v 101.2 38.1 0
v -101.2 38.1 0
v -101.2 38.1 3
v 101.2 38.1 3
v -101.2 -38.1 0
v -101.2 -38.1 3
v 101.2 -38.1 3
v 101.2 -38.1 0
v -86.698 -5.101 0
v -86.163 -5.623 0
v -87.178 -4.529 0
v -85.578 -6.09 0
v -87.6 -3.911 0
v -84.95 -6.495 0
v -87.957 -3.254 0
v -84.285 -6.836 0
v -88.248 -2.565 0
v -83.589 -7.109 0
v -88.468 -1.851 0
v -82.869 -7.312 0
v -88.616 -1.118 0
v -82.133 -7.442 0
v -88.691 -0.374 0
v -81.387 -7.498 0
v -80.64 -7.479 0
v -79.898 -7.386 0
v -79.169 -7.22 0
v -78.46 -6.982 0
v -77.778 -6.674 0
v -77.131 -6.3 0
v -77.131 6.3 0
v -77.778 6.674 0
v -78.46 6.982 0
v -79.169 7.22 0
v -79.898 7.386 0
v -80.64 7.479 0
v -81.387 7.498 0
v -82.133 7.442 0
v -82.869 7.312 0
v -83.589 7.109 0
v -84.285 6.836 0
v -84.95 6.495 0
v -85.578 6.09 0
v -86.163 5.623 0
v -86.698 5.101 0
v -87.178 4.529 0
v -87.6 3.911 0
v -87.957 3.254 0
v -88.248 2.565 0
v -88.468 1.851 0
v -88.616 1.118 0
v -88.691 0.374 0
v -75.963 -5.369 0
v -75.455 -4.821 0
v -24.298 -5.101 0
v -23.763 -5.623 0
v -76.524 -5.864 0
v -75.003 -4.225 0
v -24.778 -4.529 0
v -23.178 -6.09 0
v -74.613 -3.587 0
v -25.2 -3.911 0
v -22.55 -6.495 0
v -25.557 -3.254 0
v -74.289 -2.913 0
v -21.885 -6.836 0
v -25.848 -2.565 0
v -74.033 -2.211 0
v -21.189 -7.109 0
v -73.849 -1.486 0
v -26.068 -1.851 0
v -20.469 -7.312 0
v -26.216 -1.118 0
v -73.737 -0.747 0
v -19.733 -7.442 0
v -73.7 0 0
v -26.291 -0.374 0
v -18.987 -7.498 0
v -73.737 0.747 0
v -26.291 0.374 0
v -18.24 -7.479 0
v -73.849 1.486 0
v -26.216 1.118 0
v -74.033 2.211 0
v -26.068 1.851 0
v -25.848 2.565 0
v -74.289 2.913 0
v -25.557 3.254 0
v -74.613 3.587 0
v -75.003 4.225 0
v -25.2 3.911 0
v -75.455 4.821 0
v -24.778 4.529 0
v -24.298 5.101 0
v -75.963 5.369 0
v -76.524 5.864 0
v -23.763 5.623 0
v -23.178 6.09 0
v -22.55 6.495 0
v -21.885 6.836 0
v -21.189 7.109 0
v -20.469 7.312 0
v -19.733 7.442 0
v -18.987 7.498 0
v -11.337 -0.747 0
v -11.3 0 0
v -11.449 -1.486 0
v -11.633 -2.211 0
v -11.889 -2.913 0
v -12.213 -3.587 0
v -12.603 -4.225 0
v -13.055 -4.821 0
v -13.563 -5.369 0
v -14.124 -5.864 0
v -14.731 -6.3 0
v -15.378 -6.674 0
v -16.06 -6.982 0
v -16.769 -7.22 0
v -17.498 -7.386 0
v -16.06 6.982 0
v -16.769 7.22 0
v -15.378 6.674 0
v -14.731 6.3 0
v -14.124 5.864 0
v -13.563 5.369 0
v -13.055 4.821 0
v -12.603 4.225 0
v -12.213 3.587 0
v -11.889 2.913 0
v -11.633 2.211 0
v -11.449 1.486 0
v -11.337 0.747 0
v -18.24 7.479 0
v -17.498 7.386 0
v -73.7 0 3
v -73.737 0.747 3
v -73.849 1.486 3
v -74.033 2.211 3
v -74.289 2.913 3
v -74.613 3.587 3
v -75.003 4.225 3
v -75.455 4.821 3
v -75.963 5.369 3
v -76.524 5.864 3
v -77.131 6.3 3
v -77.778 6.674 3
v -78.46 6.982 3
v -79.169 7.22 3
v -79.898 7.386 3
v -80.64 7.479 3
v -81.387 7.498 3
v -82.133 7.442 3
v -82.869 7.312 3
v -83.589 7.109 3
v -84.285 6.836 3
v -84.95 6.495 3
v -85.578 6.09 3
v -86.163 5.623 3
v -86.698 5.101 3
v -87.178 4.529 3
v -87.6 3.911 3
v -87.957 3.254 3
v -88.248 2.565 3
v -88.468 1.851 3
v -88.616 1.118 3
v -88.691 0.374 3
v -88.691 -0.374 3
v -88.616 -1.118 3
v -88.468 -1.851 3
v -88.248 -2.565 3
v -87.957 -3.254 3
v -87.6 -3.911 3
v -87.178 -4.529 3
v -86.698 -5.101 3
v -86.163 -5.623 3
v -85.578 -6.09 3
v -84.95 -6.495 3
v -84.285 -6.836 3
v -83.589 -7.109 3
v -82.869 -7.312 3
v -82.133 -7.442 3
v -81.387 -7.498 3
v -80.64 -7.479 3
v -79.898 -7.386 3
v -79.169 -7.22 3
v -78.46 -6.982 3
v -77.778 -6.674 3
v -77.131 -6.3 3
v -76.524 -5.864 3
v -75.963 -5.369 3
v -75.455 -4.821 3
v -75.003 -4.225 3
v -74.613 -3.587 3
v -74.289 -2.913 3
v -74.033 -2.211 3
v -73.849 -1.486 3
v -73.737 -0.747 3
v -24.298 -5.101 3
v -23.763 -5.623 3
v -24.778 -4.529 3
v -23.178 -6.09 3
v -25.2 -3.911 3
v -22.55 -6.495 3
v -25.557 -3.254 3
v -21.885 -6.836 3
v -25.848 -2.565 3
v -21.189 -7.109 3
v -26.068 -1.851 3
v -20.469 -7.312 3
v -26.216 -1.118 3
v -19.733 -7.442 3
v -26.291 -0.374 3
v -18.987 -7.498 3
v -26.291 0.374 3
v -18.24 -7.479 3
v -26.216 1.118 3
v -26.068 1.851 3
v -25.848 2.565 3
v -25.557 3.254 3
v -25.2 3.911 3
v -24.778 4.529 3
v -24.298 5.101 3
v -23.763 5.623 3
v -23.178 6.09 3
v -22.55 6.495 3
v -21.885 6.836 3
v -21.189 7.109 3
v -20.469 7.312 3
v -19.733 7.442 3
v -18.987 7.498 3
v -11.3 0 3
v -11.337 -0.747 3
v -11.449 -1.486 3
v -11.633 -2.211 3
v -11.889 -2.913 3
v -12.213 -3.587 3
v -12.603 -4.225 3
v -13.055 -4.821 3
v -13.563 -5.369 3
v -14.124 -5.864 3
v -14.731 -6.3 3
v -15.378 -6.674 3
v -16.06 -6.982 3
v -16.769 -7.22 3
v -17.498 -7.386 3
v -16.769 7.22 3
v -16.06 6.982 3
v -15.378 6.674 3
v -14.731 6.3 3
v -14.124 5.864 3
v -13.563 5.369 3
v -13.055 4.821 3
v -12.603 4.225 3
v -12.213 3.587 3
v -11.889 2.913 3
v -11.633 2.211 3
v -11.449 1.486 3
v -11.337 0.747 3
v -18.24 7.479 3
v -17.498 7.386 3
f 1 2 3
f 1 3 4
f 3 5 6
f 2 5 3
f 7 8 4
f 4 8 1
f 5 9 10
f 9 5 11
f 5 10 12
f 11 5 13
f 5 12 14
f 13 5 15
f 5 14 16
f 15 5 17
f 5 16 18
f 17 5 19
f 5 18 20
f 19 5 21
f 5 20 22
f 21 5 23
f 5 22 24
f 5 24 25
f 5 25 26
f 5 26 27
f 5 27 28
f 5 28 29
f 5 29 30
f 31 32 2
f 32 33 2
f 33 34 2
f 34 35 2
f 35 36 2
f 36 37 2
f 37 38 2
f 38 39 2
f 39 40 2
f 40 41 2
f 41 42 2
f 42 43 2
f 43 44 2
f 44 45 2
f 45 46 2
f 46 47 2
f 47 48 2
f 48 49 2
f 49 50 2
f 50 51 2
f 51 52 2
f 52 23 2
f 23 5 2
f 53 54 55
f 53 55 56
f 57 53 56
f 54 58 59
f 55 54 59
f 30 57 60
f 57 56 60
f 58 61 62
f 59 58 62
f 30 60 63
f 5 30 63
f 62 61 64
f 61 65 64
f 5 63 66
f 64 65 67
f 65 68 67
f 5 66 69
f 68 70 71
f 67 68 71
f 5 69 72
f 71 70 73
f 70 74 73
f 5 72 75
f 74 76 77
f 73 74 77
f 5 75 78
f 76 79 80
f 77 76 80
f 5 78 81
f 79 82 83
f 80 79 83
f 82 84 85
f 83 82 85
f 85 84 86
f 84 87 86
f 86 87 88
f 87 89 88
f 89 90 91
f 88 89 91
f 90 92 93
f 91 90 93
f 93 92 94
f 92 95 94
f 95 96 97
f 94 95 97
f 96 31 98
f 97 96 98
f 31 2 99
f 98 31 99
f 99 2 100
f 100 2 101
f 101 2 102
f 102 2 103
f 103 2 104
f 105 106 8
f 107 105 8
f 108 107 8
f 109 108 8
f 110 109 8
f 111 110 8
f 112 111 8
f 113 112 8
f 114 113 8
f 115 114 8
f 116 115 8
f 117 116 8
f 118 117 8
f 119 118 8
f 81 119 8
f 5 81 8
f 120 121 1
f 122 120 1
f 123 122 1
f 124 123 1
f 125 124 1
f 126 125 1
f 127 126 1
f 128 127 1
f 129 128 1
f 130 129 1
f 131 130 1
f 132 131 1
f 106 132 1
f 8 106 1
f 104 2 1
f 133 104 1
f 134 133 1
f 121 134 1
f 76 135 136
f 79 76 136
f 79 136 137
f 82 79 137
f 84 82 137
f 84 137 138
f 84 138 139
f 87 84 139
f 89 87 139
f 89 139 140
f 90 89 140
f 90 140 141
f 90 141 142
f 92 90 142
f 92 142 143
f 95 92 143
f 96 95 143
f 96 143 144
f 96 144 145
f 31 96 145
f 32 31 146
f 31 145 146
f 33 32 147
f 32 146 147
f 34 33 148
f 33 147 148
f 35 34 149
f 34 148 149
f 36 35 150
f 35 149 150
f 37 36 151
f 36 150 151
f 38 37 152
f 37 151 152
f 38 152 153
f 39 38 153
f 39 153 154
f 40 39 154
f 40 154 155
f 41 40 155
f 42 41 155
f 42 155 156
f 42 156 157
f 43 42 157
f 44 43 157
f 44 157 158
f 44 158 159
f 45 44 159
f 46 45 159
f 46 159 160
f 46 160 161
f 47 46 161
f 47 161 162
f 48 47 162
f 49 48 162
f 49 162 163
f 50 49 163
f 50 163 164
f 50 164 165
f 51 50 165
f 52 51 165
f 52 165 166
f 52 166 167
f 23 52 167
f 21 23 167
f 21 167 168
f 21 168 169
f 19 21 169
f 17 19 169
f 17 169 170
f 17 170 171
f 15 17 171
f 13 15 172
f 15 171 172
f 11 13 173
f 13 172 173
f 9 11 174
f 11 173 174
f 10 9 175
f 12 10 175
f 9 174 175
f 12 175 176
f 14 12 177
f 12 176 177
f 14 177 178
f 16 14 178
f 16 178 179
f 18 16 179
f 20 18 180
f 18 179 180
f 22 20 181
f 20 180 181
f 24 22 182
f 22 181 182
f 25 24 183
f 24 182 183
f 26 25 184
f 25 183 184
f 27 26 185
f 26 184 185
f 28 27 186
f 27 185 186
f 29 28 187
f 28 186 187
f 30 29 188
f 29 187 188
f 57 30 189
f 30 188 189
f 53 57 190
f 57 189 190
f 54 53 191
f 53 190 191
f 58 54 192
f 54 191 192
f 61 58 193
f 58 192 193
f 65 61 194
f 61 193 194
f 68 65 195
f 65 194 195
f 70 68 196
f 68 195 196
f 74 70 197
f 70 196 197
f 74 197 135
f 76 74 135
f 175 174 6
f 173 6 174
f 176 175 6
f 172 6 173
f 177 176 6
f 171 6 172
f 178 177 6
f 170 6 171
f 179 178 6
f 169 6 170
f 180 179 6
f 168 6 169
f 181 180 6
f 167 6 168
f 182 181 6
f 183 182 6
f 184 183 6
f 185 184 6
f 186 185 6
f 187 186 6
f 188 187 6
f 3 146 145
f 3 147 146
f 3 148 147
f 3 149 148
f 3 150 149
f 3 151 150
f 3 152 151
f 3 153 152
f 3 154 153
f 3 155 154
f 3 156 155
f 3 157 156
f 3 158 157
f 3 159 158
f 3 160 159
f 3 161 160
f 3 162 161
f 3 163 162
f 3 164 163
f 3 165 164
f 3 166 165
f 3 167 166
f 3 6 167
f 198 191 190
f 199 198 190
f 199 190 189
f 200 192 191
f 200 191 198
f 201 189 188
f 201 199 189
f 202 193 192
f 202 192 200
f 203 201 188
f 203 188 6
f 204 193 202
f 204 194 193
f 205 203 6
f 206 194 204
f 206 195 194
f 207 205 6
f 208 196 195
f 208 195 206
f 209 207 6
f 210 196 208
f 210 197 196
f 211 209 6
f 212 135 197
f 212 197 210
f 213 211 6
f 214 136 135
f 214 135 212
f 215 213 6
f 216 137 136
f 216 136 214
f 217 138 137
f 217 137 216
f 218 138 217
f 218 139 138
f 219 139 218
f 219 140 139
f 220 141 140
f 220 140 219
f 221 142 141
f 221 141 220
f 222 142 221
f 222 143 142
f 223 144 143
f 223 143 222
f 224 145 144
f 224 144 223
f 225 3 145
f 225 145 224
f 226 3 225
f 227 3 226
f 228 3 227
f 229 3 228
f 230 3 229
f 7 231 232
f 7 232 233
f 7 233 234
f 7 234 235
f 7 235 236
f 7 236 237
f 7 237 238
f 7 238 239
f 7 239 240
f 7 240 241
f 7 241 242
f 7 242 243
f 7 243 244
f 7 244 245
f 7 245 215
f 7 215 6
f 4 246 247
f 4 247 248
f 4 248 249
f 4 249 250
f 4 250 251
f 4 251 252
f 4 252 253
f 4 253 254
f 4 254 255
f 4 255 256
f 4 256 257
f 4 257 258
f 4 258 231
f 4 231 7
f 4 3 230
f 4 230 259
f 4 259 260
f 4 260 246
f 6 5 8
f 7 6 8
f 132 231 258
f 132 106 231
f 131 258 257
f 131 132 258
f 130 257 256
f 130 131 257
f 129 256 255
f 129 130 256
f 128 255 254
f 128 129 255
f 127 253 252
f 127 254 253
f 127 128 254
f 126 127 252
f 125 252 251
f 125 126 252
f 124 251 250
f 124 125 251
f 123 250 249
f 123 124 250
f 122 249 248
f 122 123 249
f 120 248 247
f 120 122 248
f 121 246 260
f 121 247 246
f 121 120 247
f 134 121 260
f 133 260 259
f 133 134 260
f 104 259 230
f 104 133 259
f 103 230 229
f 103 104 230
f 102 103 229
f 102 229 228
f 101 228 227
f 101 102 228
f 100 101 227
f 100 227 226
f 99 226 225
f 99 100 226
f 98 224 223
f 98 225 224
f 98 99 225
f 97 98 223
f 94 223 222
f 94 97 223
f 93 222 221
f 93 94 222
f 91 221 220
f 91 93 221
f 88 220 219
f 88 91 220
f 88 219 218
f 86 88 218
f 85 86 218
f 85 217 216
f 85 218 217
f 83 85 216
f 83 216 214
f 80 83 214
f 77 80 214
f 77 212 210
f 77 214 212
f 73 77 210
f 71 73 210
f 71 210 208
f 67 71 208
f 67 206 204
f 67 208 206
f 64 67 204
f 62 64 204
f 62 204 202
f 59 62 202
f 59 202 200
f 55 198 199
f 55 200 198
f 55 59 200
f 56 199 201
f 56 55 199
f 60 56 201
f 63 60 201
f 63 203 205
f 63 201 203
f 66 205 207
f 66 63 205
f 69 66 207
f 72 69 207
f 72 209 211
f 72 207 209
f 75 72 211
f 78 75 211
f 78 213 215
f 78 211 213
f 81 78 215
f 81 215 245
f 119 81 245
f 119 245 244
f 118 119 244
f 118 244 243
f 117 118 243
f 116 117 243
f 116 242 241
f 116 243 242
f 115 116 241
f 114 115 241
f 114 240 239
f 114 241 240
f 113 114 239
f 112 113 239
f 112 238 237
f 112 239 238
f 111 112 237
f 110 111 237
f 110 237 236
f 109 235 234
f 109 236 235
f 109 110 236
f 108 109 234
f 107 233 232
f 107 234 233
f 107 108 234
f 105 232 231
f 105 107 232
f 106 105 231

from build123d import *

# Parameters (mm, degrees)
SKETCH1_W               = 202.4
SKETCH1_H               = 76.2
BOSS_EXTRUDE1_DEPTH     = 3
SKETCH2_R               = 7.5
CUT_EXTRUDE1_DEPTH      = 109.176013977
CUT_EXTRUDE2_DEPTH      = 109.176013977
CUT_EXTRUDE2_DEPTH_BACK = 109.176013977
SKETCH3_R               = 7.5


with BuildPart() as part:
    # Sketch1 → Boss-Extrude1 (new body)
    with BuildSketch(Plane.XY):
        Rectangle(SKETCH1_W, SKETCH1_H)
    extrude(amount=BOSS_EXTRUDE1_DEPTH)

    # Sketch2 → Cut-Extrude1 (cut, through all)
    with BuildSketch(Plane.XY.offset(3)):
        with Locations((-81.2, 0)):
            Circle(SKETCH2_R)
    extrude(amount=-CUT_EXTRUDE1_DEPTH, mode=Mode.SUBTRACT)

    # Sketch3 → Cut-Extrude2 (cut, two sides: drawn at the far end of the back side and taken through both)
    with BuildSketch(Plane.XY.offset(3).offset(-CUT_EXTRUDE2_DEPTH_BACK)):
        with Locations((-18.8, 0)):
            Circle(SKETCH3_R)
    extrude(amount=CUT_EXTRUDE2_DEPTH + CUT_EXTRUDE2_DEPTH_BACK, mode=Mode.SUBTRACT)


solid = part.part
